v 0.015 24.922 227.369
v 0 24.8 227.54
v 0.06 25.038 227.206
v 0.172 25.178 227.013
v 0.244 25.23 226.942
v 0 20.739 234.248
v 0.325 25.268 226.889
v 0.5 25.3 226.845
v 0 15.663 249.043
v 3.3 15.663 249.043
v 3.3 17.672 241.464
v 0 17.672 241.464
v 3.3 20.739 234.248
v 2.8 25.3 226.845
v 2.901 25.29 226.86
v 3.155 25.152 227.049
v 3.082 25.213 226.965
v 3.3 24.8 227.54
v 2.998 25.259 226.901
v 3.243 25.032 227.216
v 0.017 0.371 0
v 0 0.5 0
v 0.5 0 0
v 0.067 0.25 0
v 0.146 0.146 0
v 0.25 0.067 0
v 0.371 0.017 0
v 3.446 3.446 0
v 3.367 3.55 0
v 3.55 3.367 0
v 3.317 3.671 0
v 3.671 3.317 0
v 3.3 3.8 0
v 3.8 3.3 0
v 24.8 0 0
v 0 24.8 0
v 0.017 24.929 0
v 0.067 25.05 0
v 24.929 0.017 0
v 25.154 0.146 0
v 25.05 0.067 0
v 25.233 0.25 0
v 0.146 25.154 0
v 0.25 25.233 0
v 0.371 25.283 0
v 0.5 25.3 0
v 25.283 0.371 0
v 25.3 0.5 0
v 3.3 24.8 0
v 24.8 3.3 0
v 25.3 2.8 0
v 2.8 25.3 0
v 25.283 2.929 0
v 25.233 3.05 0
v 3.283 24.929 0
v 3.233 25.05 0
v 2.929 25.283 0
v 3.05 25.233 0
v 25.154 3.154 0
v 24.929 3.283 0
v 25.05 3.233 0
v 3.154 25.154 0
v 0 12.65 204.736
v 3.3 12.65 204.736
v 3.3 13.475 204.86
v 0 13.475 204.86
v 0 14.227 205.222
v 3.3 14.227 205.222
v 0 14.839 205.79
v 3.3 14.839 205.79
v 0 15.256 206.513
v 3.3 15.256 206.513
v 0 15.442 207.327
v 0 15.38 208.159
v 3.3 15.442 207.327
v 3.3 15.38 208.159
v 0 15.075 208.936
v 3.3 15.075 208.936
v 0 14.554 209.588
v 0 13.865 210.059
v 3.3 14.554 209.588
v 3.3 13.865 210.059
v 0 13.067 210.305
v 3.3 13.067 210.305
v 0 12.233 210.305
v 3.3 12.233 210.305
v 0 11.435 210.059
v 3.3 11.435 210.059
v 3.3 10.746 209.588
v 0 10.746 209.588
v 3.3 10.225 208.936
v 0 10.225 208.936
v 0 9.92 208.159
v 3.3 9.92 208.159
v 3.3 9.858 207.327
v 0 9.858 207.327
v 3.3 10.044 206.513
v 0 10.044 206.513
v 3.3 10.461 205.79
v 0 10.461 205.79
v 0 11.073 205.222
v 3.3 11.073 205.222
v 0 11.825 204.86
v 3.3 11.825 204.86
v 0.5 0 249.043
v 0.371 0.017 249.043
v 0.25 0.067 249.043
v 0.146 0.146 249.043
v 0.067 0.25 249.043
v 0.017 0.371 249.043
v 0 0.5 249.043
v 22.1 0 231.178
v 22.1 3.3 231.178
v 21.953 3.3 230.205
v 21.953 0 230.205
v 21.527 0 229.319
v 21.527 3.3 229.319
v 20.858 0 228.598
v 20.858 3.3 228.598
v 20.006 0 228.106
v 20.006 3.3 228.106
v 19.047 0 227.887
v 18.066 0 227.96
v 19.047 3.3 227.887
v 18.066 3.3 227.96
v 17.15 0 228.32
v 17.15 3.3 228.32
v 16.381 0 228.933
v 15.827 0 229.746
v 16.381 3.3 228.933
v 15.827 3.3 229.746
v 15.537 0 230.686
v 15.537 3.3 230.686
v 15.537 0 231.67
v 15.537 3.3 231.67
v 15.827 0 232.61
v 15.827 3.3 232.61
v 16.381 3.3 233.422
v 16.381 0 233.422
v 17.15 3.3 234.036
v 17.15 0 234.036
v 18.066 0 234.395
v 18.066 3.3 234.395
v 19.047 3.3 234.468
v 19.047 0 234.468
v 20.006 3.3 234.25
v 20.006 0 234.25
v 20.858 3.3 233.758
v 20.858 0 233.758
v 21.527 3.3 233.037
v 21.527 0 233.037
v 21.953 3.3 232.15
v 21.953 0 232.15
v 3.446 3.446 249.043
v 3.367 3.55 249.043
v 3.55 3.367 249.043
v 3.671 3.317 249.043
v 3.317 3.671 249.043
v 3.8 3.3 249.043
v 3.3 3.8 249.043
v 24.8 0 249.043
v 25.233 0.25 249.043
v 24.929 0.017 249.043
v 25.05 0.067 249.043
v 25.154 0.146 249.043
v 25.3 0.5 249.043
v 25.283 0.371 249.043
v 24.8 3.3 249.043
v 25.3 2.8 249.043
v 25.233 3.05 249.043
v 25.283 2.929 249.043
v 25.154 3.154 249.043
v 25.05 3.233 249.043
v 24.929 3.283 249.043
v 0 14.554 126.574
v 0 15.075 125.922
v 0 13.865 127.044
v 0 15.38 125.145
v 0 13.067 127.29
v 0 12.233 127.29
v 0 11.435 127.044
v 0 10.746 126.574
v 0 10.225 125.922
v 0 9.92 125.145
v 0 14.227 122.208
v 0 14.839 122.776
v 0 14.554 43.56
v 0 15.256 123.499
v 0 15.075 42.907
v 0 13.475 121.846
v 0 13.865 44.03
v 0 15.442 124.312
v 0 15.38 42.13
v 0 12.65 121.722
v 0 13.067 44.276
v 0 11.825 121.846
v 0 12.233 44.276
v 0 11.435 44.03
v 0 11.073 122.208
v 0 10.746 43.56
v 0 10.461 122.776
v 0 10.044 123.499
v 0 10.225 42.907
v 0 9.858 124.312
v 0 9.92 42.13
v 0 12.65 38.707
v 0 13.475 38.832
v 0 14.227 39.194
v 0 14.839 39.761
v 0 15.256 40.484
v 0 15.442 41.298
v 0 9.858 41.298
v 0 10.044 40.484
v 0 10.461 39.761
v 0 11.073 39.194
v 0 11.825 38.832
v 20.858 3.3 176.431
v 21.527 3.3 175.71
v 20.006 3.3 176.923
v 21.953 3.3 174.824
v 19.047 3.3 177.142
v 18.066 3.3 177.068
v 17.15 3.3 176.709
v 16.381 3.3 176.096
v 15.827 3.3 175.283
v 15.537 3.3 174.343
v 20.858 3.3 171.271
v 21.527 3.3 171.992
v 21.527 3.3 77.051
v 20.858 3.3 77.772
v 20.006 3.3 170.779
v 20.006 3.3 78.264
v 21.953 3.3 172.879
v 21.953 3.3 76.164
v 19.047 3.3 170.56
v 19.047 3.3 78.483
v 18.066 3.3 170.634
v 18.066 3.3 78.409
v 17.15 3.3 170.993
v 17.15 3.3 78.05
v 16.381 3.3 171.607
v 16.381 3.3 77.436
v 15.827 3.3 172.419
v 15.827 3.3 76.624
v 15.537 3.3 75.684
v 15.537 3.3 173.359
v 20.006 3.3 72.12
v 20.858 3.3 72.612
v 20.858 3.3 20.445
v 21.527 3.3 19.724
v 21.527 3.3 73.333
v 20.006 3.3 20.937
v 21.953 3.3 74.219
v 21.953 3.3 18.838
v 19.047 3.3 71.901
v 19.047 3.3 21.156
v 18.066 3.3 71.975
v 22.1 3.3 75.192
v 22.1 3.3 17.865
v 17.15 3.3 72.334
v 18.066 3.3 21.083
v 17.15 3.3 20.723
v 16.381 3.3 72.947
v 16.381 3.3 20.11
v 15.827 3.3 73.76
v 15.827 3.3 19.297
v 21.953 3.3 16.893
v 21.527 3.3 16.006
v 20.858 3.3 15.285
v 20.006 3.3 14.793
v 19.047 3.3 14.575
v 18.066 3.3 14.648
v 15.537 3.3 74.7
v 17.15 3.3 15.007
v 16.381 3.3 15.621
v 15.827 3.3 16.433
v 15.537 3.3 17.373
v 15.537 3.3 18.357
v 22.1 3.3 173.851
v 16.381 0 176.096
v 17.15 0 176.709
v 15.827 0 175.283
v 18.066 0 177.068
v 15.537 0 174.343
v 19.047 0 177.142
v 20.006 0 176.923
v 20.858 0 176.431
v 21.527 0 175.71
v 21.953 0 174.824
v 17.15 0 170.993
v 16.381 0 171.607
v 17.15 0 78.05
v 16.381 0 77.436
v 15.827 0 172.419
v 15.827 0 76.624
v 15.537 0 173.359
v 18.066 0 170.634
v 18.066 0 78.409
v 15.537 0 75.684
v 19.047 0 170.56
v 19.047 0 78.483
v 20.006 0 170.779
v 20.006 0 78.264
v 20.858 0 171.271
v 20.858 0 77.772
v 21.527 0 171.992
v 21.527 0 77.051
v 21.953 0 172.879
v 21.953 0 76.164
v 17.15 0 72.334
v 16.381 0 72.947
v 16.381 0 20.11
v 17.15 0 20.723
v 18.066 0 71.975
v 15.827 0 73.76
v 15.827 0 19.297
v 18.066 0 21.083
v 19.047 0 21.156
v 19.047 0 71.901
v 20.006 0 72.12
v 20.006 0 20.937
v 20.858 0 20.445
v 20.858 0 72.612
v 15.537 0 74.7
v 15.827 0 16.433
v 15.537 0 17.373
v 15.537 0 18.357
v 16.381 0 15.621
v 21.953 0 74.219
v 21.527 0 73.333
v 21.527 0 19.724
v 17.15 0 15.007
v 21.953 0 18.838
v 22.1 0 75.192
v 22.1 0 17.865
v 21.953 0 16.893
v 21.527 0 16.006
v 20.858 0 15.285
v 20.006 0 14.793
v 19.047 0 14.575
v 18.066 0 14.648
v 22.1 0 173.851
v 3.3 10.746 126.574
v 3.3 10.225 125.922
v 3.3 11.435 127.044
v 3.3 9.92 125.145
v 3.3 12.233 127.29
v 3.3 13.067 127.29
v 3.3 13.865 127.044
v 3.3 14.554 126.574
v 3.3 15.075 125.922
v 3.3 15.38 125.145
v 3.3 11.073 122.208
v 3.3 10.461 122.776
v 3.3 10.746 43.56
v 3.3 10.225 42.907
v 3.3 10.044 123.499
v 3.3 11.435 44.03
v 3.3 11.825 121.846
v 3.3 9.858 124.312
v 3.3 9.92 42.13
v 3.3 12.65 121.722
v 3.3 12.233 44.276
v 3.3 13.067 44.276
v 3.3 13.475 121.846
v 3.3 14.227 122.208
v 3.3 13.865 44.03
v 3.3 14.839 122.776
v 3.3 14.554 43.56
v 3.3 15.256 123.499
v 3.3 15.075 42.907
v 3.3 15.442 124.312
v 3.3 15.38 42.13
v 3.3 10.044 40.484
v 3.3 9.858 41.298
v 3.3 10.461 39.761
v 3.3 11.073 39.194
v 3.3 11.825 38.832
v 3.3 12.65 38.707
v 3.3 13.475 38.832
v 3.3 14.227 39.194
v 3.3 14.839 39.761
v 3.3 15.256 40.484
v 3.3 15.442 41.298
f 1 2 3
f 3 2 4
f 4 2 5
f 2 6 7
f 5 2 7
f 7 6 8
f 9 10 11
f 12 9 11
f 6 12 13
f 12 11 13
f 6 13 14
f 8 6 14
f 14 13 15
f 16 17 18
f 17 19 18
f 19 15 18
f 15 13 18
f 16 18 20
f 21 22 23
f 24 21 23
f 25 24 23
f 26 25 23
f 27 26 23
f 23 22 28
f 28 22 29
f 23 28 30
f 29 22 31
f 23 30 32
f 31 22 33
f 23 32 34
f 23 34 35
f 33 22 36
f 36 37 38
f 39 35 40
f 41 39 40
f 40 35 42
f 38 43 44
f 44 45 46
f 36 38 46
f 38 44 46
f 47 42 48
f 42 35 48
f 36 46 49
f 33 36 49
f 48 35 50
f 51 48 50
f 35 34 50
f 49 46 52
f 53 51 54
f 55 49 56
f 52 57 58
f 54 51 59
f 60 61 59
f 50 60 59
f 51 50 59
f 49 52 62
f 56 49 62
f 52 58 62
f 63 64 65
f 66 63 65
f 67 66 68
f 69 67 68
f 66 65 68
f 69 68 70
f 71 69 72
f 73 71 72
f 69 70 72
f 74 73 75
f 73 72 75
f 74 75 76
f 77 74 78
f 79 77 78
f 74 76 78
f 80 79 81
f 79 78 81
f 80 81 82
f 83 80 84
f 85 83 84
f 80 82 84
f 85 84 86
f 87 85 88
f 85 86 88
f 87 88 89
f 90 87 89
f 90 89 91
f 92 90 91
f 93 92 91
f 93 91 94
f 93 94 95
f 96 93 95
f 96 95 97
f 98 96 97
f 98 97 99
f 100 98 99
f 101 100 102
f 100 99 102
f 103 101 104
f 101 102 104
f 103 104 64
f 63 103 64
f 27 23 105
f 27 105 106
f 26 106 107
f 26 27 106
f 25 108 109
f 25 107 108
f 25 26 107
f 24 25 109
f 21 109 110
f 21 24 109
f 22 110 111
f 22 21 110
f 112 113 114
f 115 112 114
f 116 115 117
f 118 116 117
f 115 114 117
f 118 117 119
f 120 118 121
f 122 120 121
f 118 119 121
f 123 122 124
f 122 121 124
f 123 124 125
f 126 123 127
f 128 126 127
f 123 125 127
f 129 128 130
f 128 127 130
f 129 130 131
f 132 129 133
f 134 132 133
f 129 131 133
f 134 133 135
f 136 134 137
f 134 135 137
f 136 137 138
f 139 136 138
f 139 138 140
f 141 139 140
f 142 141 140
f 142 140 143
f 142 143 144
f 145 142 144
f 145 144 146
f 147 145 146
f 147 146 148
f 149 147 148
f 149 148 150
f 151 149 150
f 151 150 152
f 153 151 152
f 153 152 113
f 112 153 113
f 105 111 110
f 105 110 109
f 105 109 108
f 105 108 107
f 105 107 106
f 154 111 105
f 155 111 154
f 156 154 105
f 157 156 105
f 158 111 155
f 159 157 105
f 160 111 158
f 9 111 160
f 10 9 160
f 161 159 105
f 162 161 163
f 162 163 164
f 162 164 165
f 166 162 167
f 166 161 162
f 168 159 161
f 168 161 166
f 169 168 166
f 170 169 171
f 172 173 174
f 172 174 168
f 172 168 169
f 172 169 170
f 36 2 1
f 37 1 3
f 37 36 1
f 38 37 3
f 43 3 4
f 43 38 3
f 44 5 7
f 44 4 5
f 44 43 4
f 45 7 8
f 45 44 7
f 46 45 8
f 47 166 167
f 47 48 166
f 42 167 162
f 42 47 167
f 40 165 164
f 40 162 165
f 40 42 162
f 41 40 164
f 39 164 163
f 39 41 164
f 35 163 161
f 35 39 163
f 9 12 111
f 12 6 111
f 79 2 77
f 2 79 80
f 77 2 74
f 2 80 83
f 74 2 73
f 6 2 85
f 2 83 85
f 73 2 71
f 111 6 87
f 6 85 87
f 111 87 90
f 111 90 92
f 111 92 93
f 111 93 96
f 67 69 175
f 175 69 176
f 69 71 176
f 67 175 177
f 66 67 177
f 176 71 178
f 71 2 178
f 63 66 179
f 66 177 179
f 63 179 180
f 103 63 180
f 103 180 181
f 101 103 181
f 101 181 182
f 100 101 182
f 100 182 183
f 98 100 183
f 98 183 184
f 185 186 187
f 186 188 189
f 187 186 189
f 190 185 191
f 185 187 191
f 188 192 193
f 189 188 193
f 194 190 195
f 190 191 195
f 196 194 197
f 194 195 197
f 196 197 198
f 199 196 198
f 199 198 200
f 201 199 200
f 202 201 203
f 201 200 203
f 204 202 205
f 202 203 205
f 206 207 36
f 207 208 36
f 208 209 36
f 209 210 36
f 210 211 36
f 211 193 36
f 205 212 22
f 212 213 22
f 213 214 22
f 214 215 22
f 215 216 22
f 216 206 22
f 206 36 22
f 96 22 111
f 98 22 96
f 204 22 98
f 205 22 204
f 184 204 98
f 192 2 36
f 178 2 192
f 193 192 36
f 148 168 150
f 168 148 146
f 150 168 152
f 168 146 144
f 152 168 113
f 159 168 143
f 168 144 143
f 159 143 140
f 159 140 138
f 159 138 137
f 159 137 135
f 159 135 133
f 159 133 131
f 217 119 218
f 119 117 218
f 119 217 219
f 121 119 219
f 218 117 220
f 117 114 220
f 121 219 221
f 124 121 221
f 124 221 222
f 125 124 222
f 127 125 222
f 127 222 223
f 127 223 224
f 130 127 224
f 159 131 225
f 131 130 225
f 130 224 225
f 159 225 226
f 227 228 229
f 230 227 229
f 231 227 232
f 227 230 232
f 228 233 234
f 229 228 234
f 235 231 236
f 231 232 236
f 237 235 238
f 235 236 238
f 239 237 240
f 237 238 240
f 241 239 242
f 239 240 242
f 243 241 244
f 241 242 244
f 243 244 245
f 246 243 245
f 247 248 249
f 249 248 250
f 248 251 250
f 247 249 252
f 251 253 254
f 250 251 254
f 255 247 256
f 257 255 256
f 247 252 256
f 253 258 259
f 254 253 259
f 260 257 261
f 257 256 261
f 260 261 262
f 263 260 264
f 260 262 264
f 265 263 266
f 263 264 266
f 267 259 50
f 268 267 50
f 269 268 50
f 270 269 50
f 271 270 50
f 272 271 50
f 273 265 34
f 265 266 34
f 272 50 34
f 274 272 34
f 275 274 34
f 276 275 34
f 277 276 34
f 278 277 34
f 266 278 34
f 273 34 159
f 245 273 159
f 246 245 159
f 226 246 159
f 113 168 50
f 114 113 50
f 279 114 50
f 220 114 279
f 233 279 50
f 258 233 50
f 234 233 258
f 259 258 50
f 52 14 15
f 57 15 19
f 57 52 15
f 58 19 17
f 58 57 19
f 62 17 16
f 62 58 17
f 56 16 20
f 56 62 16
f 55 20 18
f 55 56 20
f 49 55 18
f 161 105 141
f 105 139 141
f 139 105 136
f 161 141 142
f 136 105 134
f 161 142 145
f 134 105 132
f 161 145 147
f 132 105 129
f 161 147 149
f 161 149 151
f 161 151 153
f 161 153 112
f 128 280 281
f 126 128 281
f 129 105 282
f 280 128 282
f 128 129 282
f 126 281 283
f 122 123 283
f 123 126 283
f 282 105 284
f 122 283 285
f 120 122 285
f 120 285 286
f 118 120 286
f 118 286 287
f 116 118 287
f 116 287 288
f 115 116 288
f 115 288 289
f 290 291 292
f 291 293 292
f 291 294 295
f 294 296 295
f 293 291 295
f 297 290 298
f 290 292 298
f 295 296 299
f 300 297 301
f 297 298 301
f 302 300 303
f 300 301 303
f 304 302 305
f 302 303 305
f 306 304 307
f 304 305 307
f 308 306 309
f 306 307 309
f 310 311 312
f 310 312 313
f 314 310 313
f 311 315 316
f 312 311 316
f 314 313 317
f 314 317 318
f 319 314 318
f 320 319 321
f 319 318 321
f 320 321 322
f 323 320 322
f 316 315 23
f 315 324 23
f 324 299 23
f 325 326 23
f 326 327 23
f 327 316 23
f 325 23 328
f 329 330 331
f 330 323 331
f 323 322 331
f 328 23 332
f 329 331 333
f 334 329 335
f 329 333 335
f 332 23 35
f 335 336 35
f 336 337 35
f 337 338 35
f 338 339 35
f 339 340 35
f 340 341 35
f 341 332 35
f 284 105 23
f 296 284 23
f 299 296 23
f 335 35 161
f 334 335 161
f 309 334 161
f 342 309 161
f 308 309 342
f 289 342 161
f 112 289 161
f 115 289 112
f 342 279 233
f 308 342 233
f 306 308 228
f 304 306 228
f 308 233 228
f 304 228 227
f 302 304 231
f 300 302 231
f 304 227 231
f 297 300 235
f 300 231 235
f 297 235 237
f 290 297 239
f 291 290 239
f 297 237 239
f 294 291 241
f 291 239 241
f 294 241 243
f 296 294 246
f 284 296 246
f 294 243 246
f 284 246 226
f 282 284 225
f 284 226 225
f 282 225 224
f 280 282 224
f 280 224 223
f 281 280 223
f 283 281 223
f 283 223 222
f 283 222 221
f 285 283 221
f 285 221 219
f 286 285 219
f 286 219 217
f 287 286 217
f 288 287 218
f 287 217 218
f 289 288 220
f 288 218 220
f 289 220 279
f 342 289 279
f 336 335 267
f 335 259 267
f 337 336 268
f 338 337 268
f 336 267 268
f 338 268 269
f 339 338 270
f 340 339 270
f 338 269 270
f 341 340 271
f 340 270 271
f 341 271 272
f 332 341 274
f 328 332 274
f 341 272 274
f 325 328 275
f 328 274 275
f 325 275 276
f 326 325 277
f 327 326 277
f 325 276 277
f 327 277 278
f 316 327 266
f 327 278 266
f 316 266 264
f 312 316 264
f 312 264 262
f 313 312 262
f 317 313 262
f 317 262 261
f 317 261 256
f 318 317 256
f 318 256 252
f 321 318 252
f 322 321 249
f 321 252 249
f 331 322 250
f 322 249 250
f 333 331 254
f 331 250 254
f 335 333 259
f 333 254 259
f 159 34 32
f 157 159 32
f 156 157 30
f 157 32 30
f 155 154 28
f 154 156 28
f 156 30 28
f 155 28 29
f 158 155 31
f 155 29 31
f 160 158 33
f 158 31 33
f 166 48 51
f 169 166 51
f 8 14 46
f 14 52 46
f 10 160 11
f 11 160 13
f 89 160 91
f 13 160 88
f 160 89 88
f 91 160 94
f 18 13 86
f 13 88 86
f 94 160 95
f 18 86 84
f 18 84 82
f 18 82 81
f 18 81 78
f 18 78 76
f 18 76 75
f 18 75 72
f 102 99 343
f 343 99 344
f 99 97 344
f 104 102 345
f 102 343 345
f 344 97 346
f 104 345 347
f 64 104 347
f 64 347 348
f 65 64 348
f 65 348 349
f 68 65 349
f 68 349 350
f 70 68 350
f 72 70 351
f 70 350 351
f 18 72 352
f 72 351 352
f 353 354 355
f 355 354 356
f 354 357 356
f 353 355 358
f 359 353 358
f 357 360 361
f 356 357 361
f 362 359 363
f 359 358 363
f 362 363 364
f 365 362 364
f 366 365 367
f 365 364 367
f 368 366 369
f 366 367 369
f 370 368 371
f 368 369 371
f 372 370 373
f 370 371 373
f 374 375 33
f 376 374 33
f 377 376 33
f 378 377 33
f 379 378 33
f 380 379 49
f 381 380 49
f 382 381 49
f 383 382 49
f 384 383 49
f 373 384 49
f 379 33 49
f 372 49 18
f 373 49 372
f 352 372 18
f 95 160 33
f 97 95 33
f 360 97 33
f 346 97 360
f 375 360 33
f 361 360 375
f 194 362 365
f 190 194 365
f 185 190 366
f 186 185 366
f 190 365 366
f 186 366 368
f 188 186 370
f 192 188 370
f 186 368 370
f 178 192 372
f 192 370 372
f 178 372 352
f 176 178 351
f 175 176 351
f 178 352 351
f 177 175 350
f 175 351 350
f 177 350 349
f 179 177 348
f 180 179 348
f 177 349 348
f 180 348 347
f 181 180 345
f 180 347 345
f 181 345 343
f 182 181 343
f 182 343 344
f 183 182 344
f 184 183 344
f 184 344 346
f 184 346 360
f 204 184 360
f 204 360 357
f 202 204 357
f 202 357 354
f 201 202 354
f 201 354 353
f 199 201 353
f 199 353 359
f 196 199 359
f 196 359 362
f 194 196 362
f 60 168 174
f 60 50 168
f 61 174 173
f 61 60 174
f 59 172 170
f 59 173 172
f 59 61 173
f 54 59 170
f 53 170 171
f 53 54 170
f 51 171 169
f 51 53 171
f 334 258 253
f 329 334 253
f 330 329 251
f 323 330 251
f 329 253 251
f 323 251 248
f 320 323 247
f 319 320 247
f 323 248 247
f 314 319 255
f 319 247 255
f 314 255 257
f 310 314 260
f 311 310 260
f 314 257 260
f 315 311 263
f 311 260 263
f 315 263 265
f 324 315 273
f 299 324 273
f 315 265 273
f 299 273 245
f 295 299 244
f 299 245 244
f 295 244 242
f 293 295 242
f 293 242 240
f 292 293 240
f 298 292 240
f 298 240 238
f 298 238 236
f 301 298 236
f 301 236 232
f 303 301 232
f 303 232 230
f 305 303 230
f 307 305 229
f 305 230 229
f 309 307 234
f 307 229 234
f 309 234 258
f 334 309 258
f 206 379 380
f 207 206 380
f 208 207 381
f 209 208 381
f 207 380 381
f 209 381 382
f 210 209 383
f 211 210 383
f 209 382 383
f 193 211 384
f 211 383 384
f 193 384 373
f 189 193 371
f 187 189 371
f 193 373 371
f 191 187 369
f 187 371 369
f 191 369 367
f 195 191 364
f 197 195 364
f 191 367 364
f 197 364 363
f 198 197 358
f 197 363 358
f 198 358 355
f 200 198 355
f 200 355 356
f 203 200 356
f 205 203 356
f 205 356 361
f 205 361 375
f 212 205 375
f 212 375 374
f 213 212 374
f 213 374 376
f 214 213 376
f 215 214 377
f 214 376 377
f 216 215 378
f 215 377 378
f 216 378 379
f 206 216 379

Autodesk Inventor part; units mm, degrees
ref_plane "YZ Plane" through (0, 0, 0) normal (1, 0, 0) x (0, 1, 0)
ref_plane "XZ Plane" through (0, 0, 0) normal (0, 1, 0) x (-1, 0, 0)
ref_plane "XY Plane" through (0, 0, 0) normal (0, 0, 1) x (1, 0, 0)
sketch "Sketch1" plane through (0, 0, 0) normal (0, 0, 1) x (1, 0, 0)
  line L0 (0.5, 0) -> (3.3, 0)
  line L1 (3.3, 3.8) -> (3.3, 24.8)
  line L2 (2.8, 25.3) -> (0.5, 25.3)
  line L3 (0, 24.8) -> (0, 0.5)
  line L4 (0, 0) -> (24.8, 0)
  line L5 (25.3, 0.5) -> (25.3, 2.8)
  line L6 (24.8, 3.3) -> (3.8, 3.3)
  line L7 (0, 3.3) -> (0, 0)
  arc A0 (3.3, 24.8) -> (2.8, 25.3) centre (2.8, 24.8) ccw
  arc A1 (0.5, 25.3) -> (0, 24.8) centre (0.5, 24.8) ccw
  arc A2 (3.3, 3.8) -> (3.8, 3.3) centre (3.8, 3.8) ccw
  arc A3 (0, 0.5) -> (0.5, 0) centre (0.5, 0.5) ccw
  arc A4 (24.8, 0) -> (25.3, 0.5) centre (24.8, 0.5) ccw
  arc A5 (25.3, 2.8) -> (24.8, 3.3) centre (24.8, 2.8) ccw
  point P0 (3.3, 25.3)
  point P1 (0, 25.3)
  point P2 (25.3, 3.3)
  point P3 (25.3, 0)
  dimension "d0" = 3.3
  dimension "d1" = 25.3
  dimension "d2" = 25.3
  dimension "d3" = 3.3
  dimension "d4" = 0.5
extrude "Extrusion1" add sketch "Sketch1" along normal blind 249.043 contours A3 L3 A1 L2 A0 L1 A2 L6 A5 L5 A4 L4 L0
sketch "Sketch2" plane through (3.8, 3.3, 0) normal (0, 1, 0) x (1, 0, 0)
  circle A0 centre (15, -231.1777) radius 3.3
  line L0 (21, -249.043) -> (0, -249.043) projected
  line L1 (-3.8, 0) -> (-3.8, -249.043) construction
  line L2 (-3.8, -124.5215) -> (21, -124.5215) construction
  line L3 (21, 0) -> (21, -249.043) construction
  circle A1 centre (15, -17.8653) radius 3.3
  line L4 (15, -231.1777) -> (15, -124.5215) construction
  line L5 (15, -124.5215) -> (15, -17.8653) construction
  circle A2 centre (15, -75.1918) radius 3.3
  circle A3 centre (15, -173.8512) radius 3.3
  dimension "d7" = 6.6
  dimension "d9" = 6
  dimension "d12" = 213.3123
  dimension "d23" = 6.6
extrude "Extrusion2" cut sketch "Sketch2" against normal through all
sketch "Sketch3" plane through (3.3, 3.8, 0) normal (1, 0, 0) x (0, 0, -1)
  line L0 (-249.043, 21) -> (-249.043, -3.3) construction
  line L1 (-249.043, 8.85) -> (0, 8.85) construction
  line L2 (0, 21) -> (0, -3.3) projected
  circle A0 centre (-124.5215, 8.85) radius 2.8
  circle A1 centre (-207.5358, 8.85) radius 2.8
  circle A2 centre (-41.5072, 8.85) radius 2.8
  line L3 (-249.043, 0) -> (-249.043, 21) projected
  line L4 (0, 21.5) -> (-249.043, 21.5) projected
  line L5 (-249.043, 21.5) -> (-249.043, 21) projected
  arc A3 (-262.8543, 11.011) -> (-243.3985, 118.5449) centre (-259.3098, 65.8967) ccw projected
  point P0 (0, -3.8)
  point P1 (-249.043, 11.8634)
  point P2 (-226.8454, 21.5)
  dimension "d14" = 5.6
  dimension "d15" = 249.043
  dimension "d16" = 124.5215
  dimension "d17" = 5.6
  dimension "d18" = 5.6
  dimension "d19" = 41.5072
  dimension "d20" = 41.5072
extrude "Extrusion3" cut sketch "Sketch3" against normal blind 10
equation "\"d16\" = 0.5 * d15"
equation "\"d19\" = 0.333333 * d16"
equation "\"d20\" = 0.333333 * d16"
properties part number "1in Angle x 250" material "Aluminum 6061"
